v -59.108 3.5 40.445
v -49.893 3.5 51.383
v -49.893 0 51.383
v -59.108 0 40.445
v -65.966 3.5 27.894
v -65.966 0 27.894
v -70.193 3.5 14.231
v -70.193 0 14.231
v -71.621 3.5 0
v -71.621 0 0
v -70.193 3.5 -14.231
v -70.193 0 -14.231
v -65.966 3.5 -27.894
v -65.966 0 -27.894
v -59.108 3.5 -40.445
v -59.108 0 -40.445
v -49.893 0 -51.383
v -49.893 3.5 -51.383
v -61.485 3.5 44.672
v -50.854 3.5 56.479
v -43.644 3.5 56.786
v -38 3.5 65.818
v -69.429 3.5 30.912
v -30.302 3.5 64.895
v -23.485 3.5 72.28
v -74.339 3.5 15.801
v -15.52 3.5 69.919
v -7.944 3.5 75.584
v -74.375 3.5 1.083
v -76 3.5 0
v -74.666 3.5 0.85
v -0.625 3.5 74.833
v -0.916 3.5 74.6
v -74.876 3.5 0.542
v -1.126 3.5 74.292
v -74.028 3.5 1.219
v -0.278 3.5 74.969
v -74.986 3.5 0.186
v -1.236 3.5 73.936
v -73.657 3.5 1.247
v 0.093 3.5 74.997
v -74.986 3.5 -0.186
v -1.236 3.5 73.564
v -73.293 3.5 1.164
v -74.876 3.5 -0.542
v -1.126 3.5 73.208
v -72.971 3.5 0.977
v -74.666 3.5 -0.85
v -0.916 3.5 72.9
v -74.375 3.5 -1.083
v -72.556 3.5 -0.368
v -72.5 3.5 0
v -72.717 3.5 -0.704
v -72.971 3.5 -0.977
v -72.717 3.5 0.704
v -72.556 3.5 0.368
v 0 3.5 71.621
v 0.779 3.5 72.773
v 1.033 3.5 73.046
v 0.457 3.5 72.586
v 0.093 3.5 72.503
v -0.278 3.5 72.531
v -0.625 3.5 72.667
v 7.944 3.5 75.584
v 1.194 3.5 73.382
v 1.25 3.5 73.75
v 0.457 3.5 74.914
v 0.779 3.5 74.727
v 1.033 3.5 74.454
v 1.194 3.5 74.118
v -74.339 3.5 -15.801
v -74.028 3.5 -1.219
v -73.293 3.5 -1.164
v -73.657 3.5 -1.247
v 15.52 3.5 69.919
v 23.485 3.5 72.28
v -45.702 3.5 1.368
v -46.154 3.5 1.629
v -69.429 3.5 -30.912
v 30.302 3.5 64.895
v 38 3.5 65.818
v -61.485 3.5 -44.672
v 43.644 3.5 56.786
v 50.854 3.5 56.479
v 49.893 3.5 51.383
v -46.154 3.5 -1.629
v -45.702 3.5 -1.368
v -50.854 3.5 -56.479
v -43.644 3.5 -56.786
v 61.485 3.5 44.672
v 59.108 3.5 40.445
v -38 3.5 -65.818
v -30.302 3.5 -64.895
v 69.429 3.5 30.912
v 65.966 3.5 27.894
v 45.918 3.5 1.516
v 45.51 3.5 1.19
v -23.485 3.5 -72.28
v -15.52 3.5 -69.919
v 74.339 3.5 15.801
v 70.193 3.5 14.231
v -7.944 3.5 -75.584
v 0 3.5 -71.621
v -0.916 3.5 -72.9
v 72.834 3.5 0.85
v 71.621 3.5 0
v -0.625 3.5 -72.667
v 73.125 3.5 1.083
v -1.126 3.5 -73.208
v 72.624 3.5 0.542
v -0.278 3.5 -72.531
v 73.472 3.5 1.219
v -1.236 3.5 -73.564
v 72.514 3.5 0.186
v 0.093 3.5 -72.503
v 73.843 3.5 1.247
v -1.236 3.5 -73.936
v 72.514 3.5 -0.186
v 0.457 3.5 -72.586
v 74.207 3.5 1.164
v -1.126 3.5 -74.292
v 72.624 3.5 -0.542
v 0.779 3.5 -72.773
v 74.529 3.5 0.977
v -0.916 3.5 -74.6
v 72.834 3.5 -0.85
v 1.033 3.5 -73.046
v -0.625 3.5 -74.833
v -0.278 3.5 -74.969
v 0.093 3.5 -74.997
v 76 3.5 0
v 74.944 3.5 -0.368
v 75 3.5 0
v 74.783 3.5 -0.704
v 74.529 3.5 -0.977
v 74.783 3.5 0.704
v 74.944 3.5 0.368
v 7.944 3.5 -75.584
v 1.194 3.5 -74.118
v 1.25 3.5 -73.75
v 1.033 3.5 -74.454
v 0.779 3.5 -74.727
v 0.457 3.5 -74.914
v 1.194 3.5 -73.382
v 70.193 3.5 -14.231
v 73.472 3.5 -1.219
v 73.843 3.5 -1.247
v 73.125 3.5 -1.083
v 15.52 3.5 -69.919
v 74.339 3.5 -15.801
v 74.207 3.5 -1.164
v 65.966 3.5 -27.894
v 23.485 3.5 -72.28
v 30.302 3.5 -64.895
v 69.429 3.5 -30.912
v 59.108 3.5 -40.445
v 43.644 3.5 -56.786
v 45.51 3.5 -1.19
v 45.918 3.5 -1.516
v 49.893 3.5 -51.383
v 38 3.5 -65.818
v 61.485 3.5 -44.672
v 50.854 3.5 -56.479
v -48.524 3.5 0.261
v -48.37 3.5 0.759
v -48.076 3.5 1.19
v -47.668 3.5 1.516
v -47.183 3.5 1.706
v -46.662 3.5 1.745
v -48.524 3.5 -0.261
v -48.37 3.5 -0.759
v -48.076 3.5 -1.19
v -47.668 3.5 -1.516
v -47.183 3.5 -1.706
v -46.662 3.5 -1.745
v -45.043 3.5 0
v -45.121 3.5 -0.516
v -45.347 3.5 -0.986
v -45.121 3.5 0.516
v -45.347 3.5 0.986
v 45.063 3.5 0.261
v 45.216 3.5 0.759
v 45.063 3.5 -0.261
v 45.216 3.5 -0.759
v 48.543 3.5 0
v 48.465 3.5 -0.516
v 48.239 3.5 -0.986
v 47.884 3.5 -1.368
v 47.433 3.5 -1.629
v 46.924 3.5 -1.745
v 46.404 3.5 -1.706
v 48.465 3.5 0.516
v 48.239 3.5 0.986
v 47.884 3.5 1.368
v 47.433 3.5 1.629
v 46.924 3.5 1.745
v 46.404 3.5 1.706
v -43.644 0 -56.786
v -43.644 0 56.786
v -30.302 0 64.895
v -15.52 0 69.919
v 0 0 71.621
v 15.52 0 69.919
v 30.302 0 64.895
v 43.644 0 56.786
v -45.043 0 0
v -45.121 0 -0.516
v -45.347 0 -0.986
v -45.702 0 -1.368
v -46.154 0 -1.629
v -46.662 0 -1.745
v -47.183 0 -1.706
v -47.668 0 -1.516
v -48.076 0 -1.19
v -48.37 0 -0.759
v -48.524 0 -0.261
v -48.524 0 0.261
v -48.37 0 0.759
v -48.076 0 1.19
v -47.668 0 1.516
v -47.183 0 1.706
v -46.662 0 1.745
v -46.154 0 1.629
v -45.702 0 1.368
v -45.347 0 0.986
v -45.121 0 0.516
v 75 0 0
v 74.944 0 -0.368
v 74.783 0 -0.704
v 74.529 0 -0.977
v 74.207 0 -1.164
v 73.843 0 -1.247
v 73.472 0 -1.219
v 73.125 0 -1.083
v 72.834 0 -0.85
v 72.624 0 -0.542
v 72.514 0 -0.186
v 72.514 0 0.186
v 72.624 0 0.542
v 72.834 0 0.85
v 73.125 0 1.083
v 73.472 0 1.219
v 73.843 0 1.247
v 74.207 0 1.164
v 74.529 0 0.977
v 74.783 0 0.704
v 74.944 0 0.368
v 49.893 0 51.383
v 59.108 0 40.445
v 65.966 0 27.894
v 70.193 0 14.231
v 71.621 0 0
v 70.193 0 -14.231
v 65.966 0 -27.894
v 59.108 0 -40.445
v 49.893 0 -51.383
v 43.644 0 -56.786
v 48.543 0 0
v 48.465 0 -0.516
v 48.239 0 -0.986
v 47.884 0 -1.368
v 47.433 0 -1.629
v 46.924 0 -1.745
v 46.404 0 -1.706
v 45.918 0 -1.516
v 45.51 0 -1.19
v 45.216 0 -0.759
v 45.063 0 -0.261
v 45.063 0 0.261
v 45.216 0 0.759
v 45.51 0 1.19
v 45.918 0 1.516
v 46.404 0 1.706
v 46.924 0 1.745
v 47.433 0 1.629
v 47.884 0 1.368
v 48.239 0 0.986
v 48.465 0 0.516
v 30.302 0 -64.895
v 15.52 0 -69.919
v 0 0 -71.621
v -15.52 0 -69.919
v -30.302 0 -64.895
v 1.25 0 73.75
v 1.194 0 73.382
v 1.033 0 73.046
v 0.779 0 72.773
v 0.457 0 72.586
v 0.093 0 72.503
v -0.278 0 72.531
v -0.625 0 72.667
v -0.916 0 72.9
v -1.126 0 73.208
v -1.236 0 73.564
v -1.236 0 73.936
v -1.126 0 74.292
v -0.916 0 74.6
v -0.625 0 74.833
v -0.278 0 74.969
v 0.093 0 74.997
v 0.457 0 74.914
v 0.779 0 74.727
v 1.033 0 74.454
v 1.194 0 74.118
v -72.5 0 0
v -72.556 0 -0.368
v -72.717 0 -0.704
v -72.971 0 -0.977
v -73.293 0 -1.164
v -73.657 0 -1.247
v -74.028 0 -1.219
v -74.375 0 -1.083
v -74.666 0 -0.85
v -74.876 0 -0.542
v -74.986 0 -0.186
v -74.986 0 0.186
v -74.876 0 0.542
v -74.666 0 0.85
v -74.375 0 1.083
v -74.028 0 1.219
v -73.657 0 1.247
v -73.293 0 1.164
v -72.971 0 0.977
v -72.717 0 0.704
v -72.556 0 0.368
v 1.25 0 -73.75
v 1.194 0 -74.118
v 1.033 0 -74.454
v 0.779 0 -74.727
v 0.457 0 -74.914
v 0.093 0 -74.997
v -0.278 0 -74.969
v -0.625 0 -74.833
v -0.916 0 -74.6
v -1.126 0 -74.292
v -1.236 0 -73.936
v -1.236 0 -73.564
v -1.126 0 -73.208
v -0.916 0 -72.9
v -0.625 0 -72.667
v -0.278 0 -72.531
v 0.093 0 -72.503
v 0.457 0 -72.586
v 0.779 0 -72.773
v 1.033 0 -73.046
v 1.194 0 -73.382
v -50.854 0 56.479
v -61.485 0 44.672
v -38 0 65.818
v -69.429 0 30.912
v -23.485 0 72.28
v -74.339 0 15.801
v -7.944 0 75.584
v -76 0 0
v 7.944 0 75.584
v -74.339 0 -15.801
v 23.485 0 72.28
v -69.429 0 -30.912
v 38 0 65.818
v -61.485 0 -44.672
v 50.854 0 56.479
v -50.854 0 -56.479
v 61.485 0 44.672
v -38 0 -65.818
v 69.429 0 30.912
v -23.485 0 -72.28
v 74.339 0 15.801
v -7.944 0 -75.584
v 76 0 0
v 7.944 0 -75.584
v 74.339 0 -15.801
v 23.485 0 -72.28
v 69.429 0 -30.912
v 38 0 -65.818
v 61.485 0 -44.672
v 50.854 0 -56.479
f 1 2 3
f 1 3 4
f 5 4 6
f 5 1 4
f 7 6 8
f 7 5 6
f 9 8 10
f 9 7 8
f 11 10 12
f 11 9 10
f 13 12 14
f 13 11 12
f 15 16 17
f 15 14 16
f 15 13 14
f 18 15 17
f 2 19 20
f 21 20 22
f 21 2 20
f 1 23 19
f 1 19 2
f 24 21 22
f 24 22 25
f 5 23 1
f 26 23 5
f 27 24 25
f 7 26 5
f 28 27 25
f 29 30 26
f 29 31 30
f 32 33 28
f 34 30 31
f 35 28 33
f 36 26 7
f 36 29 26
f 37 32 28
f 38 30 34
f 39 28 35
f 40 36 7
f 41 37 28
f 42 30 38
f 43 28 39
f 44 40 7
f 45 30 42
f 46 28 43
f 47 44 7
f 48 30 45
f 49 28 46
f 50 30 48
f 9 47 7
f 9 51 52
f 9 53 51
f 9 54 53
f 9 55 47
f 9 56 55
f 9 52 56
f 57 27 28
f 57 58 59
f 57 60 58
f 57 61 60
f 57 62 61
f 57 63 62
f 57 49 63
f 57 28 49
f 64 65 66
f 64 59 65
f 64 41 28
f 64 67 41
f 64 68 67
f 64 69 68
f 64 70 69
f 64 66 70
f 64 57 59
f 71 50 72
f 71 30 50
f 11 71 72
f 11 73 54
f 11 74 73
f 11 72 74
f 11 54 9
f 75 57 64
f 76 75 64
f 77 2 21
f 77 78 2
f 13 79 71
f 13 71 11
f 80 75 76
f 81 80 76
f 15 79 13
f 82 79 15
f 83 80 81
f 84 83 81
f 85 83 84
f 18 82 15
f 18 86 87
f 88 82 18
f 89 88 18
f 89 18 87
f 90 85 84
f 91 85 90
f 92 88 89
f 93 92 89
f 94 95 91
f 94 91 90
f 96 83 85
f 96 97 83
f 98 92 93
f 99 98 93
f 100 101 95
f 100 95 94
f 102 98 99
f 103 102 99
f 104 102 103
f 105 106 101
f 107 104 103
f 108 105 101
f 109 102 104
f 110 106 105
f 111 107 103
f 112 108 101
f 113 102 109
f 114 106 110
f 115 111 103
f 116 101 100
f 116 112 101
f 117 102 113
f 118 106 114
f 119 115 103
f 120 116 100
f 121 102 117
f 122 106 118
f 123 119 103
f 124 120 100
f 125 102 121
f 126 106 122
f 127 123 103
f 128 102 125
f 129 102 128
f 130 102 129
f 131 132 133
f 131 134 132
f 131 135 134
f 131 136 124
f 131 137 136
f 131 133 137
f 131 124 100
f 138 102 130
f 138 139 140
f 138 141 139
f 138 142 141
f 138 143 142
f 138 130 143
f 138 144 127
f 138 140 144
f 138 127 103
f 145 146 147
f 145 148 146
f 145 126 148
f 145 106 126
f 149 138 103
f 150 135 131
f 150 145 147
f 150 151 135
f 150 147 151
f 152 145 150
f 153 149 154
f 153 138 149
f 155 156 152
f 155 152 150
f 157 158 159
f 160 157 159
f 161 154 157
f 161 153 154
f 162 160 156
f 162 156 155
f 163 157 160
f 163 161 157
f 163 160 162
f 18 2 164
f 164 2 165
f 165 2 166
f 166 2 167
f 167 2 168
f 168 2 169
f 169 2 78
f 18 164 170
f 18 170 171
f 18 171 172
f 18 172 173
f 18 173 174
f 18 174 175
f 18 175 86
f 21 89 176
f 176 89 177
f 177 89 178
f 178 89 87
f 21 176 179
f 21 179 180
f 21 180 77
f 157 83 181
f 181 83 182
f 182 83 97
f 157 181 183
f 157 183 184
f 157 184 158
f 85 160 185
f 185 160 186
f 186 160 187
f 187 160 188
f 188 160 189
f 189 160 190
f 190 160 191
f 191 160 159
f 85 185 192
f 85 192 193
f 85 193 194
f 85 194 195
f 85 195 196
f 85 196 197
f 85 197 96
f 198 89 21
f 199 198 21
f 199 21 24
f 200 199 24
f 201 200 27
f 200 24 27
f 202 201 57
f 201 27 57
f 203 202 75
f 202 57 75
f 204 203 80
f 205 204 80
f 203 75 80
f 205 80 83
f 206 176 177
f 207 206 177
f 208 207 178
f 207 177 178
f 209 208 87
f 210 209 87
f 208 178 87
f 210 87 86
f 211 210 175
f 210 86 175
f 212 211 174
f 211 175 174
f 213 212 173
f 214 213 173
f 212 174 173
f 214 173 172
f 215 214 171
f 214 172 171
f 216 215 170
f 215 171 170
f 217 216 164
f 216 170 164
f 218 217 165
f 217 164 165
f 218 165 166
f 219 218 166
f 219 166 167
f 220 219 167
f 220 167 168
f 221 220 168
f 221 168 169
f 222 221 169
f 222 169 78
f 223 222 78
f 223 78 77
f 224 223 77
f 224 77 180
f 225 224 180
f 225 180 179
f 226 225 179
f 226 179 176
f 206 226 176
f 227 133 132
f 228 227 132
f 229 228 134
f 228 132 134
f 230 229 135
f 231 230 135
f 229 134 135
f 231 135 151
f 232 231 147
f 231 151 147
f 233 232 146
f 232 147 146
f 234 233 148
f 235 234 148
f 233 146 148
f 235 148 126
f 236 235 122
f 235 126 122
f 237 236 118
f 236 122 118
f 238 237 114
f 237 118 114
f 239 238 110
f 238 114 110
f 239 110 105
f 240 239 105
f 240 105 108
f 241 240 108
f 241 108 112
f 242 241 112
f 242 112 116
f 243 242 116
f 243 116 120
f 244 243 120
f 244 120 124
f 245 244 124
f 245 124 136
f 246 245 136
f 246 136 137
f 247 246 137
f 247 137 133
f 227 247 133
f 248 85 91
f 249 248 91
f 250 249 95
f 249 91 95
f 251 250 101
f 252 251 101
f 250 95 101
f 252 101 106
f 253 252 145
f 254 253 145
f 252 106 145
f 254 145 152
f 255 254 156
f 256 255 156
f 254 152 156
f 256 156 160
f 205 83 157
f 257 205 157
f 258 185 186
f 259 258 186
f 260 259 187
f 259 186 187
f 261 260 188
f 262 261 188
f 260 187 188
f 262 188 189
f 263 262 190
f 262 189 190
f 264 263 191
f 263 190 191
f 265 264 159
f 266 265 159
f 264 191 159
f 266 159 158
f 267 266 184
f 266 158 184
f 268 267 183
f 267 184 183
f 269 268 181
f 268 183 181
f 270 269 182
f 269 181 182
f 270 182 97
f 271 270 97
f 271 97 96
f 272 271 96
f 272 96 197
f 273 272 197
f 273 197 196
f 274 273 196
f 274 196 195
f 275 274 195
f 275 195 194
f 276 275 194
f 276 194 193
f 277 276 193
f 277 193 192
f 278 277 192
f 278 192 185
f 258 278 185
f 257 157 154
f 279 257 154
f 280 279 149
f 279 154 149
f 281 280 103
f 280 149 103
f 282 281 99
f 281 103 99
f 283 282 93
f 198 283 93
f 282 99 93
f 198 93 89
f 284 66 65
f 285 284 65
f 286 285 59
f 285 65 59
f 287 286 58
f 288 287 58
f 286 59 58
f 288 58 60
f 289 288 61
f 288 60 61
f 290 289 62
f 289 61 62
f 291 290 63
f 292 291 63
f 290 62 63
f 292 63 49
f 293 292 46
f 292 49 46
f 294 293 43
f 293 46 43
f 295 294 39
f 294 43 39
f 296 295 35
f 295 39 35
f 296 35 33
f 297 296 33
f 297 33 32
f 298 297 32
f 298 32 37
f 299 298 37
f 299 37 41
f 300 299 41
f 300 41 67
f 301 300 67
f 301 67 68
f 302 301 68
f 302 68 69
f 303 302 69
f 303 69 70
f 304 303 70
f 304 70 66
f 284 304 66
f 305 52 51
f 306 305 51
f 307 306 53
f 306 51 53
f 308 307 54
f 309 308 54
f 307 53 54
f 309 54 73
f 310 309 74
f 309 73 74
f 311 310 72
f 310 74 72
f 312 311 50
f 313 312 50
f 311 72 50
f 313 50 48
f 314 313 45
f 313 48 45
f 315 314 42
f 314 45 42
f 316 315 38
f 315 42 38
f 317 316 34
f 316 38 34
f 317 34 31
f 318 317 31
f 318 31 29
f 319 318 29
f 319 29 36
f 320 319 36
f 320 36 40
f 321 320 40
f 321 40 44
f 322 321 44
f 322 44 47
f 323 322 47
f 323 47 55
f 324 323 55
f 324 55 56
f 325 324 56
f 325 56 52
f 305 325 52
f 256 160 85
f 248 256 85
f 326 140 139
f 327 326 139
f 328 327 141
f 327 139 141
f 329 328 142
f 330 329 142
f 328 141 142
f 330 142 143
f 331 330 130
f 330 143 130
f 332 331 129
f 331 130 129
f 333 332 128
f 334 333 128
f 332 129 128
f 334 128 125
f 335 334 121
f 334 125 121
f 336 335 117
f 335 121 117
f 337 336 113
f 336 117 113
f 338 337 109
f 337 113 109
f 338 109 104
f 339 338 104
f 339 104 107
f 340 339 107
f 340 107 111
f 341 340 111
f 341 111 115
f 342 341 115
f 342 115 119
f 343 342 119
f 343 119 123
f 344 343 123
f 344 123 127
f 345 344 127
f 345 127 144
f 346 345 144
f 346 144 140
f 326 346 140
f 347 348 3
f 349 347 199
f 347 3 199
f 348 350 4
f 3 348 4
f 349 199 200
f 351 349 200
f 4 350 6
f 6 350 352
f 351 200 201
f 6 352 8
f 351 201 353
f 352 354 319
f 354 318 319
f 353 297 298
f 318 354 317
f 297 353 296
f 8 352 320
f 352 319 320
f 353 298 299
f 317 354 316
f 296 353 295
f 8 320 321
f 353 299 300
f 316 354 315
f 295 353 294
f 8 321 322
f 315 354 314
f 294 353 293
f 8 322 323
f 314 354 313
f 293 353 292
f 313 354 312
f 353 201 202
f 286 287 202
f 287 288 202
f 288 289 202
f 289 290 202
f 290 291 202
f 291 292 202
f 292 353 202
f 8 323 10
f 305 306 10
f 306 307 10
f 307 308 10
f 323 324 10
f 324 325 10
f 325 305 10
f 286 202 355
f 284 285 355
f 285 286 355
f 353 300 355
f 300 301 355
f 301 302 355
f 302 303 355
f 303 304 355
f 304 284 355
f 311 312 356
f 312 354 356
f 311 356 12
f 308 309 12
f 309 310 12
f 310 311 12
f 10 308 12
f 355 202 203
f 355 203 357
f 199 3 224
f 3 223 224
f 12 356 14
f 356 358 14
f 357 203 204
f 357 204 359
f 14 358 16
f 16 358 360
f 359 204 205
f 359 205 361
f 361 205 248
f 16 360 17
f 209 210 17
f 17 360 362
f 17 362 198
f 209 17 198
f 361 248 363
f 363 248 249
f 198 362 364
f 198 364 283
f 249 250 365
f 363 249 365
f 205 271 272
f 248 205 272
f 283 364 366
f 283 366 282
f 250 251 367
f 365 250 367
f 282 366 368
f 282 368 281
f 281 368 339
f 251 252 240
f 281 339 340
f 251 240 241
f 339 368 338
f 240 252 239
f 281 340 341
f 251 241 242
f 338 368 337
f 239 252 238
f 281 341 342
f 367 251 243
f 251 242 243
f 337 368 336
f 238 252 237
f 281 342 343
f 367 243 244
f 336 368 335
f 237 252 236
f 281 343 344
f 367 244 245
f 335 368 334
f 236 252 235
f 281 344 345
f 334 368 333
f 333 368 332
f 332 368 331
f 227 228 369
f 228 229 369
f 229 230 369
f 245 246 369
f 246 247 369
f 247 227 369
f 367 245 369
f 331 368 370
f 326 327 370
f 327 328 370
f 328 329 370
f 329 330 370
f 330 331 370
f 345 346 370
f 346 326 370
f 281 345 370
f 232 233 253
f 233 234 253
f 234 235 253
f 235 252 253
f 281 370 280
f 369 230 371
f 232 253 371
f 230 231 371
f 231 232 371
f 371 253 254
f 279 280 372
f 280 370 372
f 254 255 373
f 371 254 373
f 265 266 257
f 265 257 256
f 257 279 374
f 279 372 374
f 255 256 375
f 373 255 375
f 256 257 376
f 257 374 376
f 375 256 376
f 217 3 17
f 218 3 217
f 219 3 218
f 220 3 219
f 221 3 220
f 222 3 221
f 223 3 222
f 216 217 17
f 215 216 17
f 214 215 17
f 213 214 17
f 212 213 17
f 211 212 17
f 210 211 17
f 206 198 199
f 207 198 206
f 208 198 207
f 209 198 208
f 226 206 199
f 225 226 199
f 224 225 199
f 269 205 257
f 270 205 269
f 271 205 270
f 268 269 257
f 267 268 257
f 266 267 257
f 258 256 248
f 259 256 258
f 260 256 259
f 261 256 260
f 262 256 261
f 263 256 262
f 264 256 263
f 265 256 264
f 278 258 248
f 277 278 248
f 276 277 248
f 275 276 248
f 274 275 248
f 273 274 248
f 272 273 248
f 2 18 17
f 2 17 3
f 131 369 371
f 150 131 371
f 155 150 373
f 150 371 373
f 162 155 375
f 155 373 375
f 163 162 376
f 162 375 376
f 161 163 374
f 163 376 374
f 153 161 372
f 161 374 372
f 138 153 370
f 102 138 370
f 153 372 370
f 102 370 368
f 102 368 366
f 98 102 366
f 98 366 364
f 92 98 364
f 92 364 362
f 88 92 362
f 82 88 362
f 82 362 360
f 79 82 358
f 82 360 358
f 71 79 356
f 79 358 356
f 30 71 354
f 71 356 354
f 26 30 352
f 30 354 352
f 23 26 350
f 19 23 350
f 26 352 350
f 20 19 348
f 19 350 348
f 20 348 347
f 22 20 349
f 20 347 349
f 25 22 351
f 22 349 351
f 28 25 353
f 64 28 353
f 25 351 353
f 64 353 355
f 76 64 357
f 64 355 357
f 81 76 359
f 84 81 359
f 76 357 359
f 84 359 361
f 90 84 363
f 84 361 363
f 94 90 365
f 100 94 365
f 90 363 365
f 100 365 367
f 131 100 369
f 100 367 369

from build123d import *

# Parameters (mm, degrees)
SKETCH1_R           = 76
BOSS_EXTRUDE1_DEPTH = 3.5
CUT_EXTRUDE1_DEPTH  = 4.5
SKETCH3_R           = 1.75
CUT_EXTRUDE2_DEPTH  = 4.5
SKETCH5_R           = 1.25
CUT_EXTRUDE3_DEPTH  = 4.5


with BuildPart() as part:
    # Sketch1 → Boss-Extrude1 (new body)
    with BuildSketch(Plane(origin=(0, 0, 0), x_dir=(1, 0, 0), z_dir=(0, 1, 0))):
        Circle(SKETCH1_R)
    extrude(amount=BOSS_EXTRUDE1_DEPTH)

    # Sketch2 → Cut-Extrude1 (cut, through all)
    with BuildSketch(Plane(origin=(0, 3.5, 0), x_dir=(1, 0, 0), z_dir=(0, 1, 0))):
        with BuildLine():
            Line((-49.893169191, 51.382751627), (-49.893169191, -51.382751627))
            ThreePointArc((-49.893169191, -51.382751627), (-71.620635969, 0), (-49.893169191, 51.382751627))
        make_face()
        with BuildLine():
            Line((-43.644274738, 56.786378466), (-43.644274738, -56.786378466))
            ThreePointArc((-43.644274738, -56.786378466), (0, -71.620635969), (43.644274738, -56.786378466))
            Line((43.644274738, -56.786378466), (43.644274738, 56.786378466))
            ThreePointArc((43.644274738, 56.786378466), (0, 71.620635969), (-43.644274738, 56.786378466))
        make_face()
        with BuildLine():
            Line((49.893169191, 51.382751627), (49.893169191, -51.382751627))
            ThreePointArc((49.893169191, -51.382751627), (71.620635969, 0), (49.893169191, 51.382751627))
        make_face()
    extrude(amount=-CUT_EXTRUDE1_DEPTH, mode=Mode.SUBTRACT)

    # Sketch3 → Cut-Extrude2 (cut, through all)
    with BuildSketch(Plane(origin=(0, 3.5, 0), x_dir=(1, 0, 0), z_dir=(0, 1, 0))):
        with Locations((-46.793169191, 0)):
            Circle(SKETCH3_R)
        with Locations((46.793169191, 0)):
            Circle(SKETCH3_R)
    extrude(amount=-CUT_EXTRUDE2_DEPTH, mode=Mode.SUBTRACT)

    # Sketch5 → Cut-Extrude3 (cut, through all)
    with BuildSketch(Plane(origin=(0, 3.5, 0), x_dir=(1, 0, 0), z_dir=(0, 1, 0))):
        with Locations((0, -73.75)):
            Circle(SKETCH5_R)
        with Locations((-73.75, 0)):
            Circle(SKETCH5_R)
        with Locations((73.75, 0)):
            Circle(SKETCH5_R)
        with Locations((0, 73.75)):
            Circle(SKETCH5_R)
    extrude(amount=-CUT_EXTRUDE3_DEPTH, mode=Mode.SUBTRACT)


solid = part.part
